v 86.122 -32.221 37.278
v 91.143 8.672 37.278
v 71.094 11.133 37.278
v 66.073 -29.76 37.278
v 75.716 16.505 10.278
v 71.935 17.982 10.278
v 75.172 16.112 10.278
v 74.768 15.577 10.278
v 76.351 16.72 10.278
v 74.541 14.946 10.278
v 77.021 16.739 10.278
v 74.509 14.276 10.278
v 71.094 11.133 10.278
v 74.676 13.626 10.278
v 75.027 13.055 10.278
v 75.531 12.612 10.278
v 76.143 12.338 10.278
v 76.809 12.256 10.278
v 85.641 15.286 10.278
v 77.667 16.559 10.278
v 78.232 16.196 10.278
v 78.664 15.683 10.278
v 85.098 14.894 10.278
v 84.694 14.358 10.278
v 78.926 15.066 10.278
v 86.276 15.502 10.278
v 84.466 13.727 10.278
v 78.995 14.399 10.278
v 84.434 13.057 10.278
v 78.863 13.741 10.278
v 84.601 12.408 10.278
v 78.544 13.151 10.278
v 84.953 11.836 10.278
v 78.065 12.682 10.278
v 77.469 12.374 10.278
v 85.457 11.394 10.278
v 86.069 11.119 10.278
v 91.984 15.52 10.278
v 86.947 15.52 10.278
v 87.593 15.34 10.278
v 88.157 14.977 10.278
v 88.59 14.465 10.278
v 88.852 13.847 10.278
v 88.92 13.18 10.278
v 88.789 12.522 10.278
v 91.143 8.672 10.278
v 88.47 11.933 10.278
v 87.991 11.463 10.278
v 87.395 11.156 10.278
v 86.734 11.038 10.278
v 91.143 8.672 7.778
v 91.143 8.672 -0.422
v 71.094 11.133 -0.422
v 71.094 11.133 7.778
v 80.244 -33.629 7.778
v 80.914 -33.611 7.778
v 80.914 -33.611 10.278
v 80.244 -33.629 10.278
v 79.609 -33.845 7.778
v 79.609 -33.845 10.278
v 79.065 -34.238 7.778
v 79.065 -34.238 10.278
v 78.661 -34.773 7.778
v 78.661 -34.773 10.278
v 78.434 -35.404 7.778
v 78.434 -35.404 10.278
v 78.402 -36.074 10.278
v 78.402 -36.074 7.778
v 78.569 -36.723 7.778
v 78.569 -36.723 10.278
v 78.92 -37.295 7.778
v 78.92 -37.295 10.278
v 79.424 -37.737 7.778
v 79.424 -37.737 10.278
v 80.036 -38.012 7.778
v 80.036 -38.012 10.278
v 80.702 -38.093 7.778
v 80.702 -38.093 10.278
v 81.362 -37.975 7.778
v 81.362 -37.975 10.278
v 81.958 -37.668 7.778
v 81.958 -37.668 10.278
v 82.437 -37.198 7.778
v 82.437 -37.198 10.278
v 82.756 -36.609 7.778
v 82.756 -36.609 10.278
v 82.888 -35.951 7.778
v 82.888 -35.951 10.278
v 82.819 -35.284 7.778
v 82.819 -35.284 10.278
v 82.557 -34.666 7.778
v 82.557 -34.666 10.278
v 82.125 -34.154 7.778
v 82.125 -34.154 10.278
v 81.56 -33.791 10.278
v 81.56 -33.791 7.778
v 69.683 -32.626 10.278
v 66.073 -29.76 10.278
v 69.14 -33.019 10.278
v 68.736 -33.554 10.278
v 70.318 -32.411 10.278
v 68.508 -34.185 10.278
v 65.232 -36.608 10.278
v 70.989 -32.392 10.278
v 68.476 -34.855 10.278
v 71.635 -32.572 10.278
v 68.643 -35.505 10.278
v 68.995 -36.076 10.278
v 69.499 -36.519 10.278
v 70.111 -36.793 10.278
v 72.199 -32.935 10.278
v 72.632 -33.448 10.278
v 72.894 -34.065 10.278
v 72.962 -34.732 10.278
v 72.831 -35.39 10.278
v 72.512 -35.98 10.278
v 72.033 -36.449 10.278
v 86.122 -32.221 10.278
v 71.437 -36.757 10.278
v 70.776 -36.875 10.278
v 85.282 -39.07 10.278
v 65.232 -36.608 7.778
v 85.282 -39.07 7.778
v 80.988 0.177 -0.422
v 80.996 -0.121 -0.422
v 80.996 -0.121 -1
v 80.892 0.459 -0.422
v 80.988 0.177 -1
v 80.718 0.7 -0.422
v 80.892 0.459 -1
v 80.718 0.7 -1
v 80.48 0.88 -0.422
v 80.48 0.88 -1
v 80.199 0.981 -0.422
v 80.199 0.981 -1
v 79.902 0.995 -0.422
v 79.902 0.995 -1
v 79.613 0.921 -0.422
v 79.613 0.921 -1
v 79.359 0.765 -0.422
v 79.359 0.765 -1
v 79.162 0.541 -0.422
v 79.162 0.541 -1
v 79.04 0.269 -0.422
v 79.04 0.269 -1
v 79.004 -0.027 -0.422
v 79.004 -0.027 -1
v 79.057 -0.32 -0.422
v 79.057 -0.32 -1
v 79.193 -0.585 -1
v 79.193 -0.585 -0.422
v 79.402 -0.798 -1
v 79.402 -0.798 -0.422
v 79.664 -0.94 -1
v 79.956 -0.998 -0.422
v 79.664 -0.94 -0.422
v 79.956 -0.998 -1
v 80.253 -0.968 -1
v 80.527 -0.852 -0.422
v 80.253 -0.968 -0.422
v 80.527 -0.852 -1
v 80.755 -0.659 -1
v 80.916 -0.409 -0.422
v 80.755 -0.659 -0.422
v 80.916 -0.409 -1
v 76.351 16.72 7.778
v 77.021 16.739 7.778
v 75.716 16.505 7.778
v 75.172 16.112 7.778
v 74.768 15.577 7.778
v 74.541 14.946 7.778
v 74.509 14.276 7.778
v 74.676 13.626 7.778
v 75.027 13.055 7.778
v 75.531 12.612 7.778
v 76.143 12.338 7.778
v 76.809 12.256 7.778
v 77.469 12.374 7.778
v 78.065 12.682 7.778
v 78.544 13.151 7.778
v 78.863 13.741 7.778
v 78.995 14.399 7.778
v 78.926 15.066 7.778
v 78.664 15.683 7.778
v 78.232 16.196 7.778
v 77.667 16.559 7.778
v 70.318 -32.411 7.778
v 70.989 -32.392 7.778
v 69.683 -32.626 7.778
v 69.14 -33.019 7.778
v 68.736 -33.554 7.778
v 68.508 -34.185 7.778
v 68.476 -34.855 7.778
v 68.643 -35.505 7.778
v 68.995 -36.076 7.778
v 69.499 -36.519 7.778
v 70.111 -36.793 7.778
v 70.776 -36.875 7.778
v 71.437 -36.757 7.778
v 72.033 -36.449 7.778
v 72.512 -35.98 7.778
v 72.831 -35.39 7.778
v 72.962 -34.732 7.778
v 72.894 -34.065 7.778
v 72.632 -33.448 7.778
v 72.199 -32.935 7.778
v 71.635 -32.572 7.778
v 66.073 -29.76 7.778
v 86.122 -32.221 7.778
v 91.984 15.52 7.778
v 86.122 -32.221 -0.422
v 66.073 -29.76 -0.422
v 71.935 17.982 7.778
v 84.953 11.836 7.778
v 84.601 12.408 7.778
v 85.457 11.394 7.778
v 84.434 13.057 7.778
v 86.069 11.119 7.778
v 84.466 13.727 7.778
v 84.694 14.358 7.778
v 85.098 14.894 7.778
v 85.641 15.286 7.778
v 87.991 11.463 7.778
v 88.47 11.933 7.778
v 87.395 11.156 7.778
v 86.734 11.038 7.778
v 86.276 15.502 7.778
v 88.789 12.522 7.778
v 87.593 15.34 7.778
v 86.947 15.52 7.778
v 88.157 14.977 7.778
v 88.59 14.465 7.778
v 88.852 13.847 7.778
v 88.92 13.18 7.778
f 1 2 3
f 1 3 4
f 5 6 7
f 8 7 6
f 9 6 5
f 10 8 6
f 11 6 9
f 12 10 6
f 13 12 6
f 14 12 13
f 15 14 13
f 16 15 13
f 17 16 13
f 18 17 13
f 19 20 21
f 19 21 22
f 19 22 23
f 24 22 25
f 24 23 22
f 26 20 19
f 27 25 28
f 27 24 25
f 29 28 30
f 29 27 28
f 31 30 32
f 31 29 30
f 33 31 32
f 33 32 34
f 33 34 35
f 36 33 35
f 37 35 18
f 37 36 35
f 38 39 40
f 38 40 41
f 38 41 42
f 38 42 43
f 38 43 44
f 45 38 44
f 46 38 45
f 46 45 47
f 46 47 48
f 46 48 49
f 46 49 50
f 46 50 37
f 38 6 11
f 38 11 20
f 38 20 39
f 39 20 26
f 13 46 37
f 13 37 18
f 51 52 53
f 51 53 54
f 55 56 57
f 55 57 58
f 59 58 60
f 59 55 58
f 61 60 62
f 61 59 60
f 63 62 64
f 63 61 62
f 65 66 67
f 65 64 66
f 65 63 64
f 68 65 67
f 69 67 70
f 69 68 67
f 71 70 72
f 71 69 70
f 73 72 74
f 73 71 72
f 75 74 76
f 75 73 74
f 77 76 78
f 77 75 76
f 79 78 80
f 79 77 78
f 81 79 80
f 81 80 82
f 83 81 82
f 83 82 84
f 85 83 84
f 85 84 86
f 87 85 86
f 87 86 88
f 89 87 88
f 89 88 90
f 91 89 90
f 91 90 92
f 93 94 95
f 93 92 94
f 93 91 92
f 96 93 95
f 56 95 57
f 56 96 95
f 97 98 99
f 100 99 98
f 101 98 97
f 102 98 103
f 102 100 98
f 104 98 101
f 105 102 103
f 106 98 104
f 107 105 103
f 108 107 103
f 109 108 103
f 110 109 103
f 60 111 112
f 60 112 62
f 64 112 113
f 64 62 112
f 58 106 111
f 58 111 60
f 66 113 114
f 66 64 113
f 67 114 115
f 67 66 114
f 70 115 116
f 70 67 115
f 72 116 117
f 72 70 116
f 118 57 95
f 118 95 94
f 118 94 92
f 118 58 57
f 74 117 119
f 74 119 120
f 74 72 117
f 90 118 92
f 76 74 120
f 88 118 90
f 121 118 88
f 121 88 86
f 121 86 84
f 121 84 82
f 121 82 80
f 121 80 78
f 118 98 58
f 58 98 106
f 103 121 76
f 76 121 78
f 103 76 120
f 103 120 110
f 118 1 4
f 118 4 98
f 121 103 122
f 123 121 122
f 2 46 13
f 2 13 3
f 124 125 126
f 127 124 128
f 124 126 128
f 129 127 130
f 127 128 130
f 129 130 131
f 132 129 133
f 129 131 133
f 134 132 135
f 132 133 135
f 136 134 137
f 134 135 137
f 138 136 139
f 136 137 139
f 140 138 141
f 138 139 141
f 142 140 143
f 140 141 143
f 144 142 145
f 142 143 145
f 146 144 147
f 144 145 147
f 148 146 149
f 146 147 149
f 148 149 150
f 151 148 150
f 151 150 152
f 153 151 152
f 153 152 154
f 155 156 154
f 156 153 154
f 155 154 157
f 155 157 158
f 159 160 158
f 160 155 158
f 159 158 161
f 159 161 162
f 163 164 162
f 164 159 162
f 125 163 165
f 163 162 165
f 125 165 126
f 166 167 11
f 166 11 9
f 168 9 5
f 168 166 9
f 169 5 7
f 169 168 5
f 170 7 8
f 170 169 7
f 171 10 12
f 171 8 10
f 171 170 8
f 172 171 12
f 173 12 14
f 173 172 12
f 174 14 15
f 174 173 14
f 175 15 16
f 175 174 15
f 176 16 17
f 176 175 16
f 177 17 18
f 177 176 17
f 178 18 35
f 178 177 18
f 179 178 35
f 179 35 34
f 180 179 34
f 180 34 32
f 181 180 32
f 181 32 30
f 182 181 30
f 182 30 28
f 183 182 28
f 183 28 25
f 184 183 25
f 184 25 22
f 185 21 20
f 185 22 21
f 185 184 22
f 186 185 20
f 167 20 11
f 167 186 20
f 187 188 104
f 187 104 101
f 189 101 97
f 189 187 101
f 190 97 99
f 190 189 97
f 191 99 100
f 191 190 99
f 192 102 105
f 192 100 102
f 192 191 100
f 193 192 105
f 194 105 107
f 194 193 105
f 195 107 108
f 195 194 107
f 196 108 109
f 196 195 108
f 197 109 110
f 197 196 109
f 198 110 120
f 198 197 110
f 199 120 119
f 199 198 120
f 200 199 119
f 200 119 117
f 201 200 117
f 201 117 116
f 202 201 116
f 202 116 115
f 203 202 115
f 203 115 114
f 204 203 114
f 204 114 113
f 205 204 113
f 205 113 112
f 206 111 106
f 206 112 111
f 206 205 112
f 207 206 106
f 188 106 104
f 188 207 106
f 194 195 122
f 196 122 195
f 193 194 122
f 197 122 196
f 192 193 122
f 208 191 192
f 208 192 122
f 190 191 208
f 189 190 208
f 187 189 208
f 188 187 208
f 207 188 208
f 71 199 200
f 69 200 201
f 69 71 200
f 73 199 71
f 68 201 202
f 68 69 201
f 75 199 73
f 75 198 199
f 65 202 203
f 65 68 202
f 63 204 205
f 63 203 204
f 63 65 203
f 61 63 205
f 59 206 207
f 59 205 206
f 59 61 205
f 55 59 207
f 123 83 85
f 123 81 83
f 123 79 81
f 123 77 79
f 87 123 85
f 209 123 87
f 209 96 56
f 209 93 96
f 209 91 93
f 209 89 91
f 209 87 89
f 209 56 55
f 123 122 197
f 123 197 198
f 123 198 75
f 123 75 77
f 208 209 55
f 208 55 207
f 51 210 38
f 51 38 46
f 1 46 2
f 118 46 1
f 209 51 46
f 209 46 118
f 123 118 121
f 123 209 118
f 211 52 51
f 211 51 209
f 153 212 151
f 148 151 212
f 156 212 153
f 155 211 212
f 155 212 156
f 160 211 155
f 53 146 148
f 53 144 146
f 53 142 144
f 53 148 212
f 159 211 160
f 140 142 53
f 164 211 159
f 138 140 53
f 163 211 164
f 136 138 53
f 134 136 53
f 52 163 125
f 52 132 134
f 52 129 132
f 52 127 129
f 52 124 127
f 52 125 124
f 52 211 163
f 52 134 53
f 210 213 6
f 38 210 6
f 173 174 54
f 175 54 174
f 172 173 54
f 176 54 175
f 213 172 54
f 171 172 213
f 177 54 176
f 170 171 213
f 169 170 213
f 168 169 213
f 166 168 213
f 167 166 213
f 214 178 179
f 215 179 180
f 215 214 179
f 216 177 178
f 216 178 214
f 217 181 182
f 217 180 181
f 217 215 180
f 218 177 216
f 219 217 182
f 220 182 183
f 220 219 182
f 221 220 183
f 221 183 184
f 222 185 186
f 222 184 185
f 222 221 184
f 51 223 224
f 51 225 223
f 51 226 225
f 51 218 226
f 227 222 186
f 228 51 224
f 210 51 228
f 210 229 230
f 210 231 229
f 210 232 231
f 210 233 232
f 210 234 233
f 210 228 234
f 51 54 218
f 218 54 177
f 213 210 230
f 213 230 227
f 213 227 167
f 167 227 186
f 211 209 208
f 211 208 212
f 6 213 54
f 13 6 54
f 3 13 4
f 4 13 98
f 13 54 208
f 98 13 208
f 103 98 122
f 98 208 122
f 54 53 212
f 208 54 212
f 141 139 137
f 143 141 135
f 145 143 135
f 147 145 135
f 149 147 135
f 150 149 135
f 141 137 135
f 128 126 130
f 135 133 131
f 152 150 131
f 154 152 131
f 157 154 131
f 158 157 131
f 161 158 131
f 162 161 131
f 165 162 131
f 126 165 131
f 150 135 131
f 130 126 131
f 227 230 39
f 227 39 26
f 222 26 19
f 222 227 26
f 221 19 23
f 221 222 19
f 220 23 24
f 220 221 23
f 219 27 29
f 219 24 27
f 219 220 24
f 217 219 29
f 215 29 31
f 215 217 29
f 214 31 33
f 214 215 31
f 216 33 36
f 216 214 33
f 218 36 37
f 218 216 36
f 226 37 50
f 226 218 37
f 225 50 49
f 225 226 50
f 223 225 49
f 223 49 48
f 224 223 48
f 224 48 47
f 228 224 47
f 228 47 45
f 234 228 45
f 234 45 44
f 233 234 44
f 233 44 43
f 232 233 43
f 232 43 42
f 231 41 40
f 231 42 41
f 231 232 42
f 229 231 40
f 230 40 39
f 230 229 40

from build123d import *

# Parameters (mm, degrees)
CYLINDER011_R             = 1
CYLINDER011_DEPTH         = 1
CYLINDER003_R             = 2.25
CYLINDER003_DEPTH         = 10
ARRAY_X_COUNT             = 2
ARRAY_X_PITCH             = 49.5
ARRAY_Z_COUNT             = 2
ARRAY_Z_PITCH             = 10
EXTRUDE003_DEPTH          = 20.2
CUT004_ROLL_ANGLE         = -90
CUT004_PLACEMENT_ANGLE    = 90
FUSION002_PLACEMENT_ANGLE = 7


with BuildPart() as cylinder011:
    # Cylinder011 → Cylinder011 (new body)
    with BuildSketch(Plane(origin=(80, 0, -1), x_dir=(1, 0, 0), z_dir=(0, 0, 1))):
        Circle(CYLINDER011_R)
    extrude(amount=CYLINDER011_DEPTH)


with BuildPart() as array:
    # Cylinder003 → Cylinder003 (new body)
    with BuildSketch(Plane.XZ):
        Circle(CYLINDER003_R)
    extrude(amount=CYLINDER003_DEPTH)

    # Array X: Array ×2


with BuildPart() as array_1:
    add(array.part)
    with Locations(*[(i * ARRAY_X_PITCH, 0, 0) for i in range(1, ARRAY_X_COUNT)]):
        add(array.part)

    # Array Z: Array ×2


with BuildPart() as array_2:
    add(array_1.part)
    with Locations(*[(0, 0, i * ARRAY_Z_PITCH) for i in range(1, ARRAY_Z_COUNT)]):
        add(array_1.part)


with BuildPart() as array_3:
    # Array placement: moved
    add(array_2.part.moved(Location((-56.5, 22, 5))))


with BuildPart() as servo_pan:
    # Sketch002 → Extrude003 (new body)
    with BuildSketch(Plane.XY):
        Polygon((-59.135985, 19.221684), (-52.235985, 19.221684), (-52.235985, 27.421684), (-11.035985, 27.421684), (-11.035985, 19.221684), (-4.135985, 19.221684), (-4.135985, 16.721684), (-11.035985, 16.721684), (-11.035985, -10.278316), (-52.235985, -10.278316), (-52.235985, 16.721684), (-59.135985, 16.721684), align=None)
    extrude(amount=EXTRUDE003_DEPTH)

    # Cut004: cut Array
    add(array_3.part, mode=Mode.SUBTRACT)


with BuildPart() as servo_pan_1:
    # Cut004 roll: moved
    add(servo_pan.part.rotate(Axis((0, 0, 0), (1, 0, 0)), CUT004_ROLL_ANGLE))


with BuildPart() as servo_pan_2:
    # Cut004 placement: moved
    add(servo_pan_1.part.moved(Location((90, 21, 27))).rotate(Axis((90, 21, 27), (0, 0, 1)), CUT004_PLACEMENT_ANGLE))

    # Fusion002: union Cylinder011
    add(cylinder011.part)


with BuildPart() as servo_pan_3:
    # Fusion002 placement: moved
    add(servo_pan_2.part.moved(Location((0.6, 9.75, 0))).rotate(Axis((0.6, 9.75, 0), (0, 0, -1)), FUSION002_PLACEMENT_ANGLE))


solid = servo_pan_3.part
